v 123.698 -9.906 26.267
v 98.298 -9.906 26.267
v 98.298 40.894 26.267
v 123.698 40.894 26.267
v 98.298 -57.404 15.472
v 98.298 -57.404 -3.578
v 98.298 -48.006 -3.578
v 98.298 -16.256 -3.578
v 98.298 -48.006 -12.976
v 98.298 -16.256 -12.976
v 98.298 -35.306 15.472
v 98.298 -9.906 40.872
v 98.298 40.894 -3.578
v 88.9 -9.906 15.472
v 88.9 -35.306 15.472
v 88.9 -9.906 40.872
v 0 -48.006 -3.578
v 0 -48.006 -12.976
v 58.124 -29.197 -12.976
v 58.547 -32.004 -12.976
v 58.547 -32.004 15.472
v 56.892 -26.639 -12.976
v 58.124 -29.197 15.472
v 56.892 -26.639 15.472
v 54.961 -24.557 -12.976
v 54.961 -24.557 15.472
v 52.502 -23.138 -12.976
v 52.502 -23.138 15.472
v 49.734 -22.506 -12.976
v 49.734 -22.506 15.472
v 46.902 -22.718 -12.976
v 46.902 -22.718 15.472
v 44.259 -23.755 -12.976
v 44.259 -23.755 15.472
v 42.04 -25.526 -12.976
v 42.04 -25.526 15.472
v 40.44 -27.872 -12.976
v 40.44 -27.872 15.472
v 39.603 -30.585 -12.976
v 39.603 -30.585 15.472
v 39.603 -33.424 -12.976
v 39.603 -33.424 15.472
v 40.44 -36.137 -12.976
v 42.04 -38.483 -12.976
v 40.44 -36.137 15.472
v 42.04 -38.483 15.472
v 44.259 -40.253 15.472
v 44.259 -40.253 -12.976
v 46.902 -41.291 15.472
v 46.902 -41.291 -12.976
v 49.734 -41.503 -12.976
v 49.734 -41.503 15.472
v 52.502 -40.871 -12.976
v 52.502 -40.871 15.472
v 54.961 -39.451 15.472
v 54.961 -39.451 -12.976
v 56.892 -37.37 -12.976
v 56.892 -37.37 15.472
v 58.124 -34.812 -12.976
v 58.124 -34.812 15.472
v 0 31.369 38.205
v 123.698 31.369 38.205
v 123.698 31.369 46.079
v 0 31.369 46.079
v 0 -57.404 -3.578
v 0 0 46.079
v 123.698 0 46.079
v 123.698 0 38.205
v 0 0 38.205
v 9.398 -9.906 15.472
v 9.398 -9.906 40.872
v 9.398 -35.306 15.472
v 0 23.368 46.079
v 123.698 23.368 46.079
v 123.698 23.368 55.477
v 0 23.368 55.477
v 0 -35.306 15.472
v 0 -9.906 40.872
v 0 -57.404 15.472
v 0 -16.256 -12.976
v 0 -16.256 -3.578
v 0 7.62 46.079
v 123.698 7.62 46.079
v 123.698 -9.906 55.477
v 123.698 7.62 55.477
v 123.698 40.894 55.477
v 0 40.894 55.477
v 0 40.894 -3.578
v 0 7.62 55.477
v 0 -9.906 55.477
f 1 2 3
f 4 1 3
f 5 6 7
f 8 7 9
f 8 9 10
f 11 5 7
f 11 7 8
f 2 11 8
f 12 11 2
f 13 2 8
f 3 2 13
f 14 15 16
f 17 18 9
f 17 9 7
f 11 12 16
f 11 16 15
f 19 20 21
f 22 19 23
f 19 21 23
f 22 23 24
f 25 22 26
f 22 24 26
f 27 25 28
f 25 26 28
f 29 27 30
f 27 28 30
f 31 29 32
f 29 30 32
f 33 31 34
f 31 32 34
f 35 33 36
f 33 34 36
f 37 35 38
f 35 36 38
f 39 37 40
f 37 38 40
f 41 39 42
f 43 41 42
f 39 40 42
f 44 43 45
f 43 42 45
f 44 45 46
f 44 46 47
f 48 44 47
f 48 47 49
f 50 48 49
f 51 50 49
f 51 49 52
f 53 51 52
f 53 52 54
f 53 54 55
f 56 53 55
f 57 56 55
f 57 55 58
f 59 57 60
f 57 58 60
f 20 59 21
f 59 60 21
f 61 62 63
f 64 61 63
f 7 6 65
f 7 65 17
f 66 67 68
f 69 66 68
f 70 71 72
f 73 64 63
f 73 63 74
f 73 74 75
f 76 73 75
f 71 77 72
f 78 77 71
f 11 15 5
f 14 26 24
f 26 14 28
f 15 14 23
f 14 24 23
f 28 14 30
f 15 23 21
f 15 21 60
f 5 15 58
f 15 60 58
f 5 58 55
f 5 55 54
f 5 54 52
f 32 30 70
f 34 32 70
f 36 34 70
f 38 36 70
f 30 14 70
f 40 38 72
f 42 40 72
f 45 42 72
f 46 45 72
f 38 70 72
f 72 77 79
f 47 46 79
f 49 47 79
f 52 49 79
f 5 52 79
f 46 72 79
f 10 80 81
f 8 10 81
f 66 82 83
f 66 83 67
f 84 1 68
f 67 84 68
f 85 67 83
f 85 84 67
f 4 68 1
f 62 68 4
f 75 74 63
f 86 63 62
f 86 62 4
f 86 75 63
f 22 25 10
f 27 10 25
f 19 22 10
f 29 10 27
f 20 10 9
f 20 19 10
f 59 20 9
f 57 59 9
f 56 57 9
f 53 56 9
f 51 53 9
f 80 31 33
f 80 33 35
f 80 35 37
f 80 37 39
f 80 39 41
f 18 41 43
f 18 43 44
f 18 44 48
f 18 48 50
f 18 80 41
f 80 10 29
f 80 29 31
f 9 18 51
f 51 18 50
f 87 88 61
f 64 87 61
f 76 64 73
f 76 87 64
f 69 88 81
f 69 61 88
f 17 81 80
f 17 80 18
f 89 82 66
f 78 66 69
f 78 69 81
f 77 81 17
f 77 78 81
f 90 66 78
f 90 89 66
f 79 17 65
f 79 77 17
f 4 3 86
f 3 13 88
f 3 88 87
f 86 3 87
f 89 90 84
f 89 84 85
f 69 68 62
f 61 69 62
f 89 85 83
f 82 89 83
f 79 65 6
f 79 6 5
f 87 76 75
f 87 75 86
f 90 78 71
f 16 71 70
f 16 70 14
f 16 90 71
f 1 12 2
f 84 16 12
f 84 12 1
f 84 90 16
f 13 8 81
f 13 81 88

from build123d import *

# Parameters (mm, degrees)
F0_W      = 50.8
F0_H      = 29.21
F1_DEPTH  = 123.698
F3_DEPTH  = 123.698
F4_W      = 98.298
F4_H      = 10.795
F5_DEPTH  = 50.8
F6_W      = 98.298
F6_H      = 28.448
F7_DEPTH  = 98.298
F10_DEPTH = 9.398
F11_DEPTH = 9.398
F12_W     = 9.398
F12_H     = 9.398
F13_DEPTH = 98.298
F14_W     = 57.15
F14_H     = 9.398
F15_DEPTH = 98.298
F16_R     = 9.525
F17_DEPTH = 28.448


with BuildPart() as f1:
    # F0 (on Right) → F1 (new body)
    with BuildSketch(Plane.YZ):
        with Locations((15.4936162289, 40.8715208429)):
            Rectangle(F0_W, F0_H)
    extrude(amount=F1_DEPTH)

    # F2 (on face) → F3 (cut)
    with BuildSketch(Plane.YZ.offset(123.698)):
        Polygon((23.3676162289, 46.0785208429), (23.3676162289, 55.4765208429), (7.6196162289, 55.4765208429), (7.6196162289, 46.0785208429), (0, 46.0785208429), (0, 38.2045208429), (31.3686162289, 38.2045208429), (31.3686162289, 46.0785208429), align=None)
    extrude(amount=-F3_DEPTH, mode=Mode.SUBTRACT)

    # F4 (on face) → F5 (join)
    with BuildSketch(Plane.XZ.offset(9.9063837711)):
        with Locations((49.149, 20.8690208429)):
            Rectangle(F4_W, F4_H)
    extrude(amount=-F5_DEPTH)

    # F6 (on face) → F7 (join)
    with BuildSketch(Plane(origin=(0, 0, 0), x_dir=(0, -1, 0), z_dir=(-1, 0, 0))):
        with Locations((8.2553837711, 1.2475208429)):
            Rectangle(F6_W, F6_H)
    extrude(amount=-F7_DEPTH)

    # F9 (on face) → F10 (join)
    with BuildSketch(Plane.YZ.offset(98.298)):
        Polygon((-35.3063837711, 15.4715208429), (-9.9063837711, 15.4715208429), (-9.9063837711, 26.2665208429), (-9.9063837711, 40.8715208429), align=None)
    extrude(amount=-F10_DEPTH)

    # F8 (on face) → F11 (join)
    with BuildSketch(Plane(origin=(0, 0, 0), x_dir=(0, -1, 0), z_dir=(-1, 0, 0))):
        Polygon((9.9063837711, 40.8715208429), (9.9063837711, 15.4715208429), (35.3063837711, 15.4715208429), align=None)
    extrude(amount=-F11_DEPTH)

    # F12 (on face) → F13 (cut)
    with BuildSketch(Plane.YZ.offset(98.298)):
        with Locations((-52.7053837711, -8.2774791571)):
            Rectangle(F12_W, F12_H)
    extrude(amount=-F13_DEPTH, mode=Mode.SUBTRACT)

    # F14 (on face) → F15 (cut)
    with BuildSketch(Plane.YZ.offset(98.298)):
        with Locations((12.3186162289, -8.2774791571)):
            Rectangle(F14_W, F14_H)
    extrude(amount=-F15_DEPTH, mode=Mode.SUBTRACT)

    # F16 (on face) → F17 (cut)
    with BuildSketch(Plane.XY.offset(15.4715208429)):
        with Locations((49.022, -32.0043837711)):
            Circle(F16_R)
    extrude(amount=-F17_DEPTH, mode=Mode.SUBTRACT)


solid = f1.part
